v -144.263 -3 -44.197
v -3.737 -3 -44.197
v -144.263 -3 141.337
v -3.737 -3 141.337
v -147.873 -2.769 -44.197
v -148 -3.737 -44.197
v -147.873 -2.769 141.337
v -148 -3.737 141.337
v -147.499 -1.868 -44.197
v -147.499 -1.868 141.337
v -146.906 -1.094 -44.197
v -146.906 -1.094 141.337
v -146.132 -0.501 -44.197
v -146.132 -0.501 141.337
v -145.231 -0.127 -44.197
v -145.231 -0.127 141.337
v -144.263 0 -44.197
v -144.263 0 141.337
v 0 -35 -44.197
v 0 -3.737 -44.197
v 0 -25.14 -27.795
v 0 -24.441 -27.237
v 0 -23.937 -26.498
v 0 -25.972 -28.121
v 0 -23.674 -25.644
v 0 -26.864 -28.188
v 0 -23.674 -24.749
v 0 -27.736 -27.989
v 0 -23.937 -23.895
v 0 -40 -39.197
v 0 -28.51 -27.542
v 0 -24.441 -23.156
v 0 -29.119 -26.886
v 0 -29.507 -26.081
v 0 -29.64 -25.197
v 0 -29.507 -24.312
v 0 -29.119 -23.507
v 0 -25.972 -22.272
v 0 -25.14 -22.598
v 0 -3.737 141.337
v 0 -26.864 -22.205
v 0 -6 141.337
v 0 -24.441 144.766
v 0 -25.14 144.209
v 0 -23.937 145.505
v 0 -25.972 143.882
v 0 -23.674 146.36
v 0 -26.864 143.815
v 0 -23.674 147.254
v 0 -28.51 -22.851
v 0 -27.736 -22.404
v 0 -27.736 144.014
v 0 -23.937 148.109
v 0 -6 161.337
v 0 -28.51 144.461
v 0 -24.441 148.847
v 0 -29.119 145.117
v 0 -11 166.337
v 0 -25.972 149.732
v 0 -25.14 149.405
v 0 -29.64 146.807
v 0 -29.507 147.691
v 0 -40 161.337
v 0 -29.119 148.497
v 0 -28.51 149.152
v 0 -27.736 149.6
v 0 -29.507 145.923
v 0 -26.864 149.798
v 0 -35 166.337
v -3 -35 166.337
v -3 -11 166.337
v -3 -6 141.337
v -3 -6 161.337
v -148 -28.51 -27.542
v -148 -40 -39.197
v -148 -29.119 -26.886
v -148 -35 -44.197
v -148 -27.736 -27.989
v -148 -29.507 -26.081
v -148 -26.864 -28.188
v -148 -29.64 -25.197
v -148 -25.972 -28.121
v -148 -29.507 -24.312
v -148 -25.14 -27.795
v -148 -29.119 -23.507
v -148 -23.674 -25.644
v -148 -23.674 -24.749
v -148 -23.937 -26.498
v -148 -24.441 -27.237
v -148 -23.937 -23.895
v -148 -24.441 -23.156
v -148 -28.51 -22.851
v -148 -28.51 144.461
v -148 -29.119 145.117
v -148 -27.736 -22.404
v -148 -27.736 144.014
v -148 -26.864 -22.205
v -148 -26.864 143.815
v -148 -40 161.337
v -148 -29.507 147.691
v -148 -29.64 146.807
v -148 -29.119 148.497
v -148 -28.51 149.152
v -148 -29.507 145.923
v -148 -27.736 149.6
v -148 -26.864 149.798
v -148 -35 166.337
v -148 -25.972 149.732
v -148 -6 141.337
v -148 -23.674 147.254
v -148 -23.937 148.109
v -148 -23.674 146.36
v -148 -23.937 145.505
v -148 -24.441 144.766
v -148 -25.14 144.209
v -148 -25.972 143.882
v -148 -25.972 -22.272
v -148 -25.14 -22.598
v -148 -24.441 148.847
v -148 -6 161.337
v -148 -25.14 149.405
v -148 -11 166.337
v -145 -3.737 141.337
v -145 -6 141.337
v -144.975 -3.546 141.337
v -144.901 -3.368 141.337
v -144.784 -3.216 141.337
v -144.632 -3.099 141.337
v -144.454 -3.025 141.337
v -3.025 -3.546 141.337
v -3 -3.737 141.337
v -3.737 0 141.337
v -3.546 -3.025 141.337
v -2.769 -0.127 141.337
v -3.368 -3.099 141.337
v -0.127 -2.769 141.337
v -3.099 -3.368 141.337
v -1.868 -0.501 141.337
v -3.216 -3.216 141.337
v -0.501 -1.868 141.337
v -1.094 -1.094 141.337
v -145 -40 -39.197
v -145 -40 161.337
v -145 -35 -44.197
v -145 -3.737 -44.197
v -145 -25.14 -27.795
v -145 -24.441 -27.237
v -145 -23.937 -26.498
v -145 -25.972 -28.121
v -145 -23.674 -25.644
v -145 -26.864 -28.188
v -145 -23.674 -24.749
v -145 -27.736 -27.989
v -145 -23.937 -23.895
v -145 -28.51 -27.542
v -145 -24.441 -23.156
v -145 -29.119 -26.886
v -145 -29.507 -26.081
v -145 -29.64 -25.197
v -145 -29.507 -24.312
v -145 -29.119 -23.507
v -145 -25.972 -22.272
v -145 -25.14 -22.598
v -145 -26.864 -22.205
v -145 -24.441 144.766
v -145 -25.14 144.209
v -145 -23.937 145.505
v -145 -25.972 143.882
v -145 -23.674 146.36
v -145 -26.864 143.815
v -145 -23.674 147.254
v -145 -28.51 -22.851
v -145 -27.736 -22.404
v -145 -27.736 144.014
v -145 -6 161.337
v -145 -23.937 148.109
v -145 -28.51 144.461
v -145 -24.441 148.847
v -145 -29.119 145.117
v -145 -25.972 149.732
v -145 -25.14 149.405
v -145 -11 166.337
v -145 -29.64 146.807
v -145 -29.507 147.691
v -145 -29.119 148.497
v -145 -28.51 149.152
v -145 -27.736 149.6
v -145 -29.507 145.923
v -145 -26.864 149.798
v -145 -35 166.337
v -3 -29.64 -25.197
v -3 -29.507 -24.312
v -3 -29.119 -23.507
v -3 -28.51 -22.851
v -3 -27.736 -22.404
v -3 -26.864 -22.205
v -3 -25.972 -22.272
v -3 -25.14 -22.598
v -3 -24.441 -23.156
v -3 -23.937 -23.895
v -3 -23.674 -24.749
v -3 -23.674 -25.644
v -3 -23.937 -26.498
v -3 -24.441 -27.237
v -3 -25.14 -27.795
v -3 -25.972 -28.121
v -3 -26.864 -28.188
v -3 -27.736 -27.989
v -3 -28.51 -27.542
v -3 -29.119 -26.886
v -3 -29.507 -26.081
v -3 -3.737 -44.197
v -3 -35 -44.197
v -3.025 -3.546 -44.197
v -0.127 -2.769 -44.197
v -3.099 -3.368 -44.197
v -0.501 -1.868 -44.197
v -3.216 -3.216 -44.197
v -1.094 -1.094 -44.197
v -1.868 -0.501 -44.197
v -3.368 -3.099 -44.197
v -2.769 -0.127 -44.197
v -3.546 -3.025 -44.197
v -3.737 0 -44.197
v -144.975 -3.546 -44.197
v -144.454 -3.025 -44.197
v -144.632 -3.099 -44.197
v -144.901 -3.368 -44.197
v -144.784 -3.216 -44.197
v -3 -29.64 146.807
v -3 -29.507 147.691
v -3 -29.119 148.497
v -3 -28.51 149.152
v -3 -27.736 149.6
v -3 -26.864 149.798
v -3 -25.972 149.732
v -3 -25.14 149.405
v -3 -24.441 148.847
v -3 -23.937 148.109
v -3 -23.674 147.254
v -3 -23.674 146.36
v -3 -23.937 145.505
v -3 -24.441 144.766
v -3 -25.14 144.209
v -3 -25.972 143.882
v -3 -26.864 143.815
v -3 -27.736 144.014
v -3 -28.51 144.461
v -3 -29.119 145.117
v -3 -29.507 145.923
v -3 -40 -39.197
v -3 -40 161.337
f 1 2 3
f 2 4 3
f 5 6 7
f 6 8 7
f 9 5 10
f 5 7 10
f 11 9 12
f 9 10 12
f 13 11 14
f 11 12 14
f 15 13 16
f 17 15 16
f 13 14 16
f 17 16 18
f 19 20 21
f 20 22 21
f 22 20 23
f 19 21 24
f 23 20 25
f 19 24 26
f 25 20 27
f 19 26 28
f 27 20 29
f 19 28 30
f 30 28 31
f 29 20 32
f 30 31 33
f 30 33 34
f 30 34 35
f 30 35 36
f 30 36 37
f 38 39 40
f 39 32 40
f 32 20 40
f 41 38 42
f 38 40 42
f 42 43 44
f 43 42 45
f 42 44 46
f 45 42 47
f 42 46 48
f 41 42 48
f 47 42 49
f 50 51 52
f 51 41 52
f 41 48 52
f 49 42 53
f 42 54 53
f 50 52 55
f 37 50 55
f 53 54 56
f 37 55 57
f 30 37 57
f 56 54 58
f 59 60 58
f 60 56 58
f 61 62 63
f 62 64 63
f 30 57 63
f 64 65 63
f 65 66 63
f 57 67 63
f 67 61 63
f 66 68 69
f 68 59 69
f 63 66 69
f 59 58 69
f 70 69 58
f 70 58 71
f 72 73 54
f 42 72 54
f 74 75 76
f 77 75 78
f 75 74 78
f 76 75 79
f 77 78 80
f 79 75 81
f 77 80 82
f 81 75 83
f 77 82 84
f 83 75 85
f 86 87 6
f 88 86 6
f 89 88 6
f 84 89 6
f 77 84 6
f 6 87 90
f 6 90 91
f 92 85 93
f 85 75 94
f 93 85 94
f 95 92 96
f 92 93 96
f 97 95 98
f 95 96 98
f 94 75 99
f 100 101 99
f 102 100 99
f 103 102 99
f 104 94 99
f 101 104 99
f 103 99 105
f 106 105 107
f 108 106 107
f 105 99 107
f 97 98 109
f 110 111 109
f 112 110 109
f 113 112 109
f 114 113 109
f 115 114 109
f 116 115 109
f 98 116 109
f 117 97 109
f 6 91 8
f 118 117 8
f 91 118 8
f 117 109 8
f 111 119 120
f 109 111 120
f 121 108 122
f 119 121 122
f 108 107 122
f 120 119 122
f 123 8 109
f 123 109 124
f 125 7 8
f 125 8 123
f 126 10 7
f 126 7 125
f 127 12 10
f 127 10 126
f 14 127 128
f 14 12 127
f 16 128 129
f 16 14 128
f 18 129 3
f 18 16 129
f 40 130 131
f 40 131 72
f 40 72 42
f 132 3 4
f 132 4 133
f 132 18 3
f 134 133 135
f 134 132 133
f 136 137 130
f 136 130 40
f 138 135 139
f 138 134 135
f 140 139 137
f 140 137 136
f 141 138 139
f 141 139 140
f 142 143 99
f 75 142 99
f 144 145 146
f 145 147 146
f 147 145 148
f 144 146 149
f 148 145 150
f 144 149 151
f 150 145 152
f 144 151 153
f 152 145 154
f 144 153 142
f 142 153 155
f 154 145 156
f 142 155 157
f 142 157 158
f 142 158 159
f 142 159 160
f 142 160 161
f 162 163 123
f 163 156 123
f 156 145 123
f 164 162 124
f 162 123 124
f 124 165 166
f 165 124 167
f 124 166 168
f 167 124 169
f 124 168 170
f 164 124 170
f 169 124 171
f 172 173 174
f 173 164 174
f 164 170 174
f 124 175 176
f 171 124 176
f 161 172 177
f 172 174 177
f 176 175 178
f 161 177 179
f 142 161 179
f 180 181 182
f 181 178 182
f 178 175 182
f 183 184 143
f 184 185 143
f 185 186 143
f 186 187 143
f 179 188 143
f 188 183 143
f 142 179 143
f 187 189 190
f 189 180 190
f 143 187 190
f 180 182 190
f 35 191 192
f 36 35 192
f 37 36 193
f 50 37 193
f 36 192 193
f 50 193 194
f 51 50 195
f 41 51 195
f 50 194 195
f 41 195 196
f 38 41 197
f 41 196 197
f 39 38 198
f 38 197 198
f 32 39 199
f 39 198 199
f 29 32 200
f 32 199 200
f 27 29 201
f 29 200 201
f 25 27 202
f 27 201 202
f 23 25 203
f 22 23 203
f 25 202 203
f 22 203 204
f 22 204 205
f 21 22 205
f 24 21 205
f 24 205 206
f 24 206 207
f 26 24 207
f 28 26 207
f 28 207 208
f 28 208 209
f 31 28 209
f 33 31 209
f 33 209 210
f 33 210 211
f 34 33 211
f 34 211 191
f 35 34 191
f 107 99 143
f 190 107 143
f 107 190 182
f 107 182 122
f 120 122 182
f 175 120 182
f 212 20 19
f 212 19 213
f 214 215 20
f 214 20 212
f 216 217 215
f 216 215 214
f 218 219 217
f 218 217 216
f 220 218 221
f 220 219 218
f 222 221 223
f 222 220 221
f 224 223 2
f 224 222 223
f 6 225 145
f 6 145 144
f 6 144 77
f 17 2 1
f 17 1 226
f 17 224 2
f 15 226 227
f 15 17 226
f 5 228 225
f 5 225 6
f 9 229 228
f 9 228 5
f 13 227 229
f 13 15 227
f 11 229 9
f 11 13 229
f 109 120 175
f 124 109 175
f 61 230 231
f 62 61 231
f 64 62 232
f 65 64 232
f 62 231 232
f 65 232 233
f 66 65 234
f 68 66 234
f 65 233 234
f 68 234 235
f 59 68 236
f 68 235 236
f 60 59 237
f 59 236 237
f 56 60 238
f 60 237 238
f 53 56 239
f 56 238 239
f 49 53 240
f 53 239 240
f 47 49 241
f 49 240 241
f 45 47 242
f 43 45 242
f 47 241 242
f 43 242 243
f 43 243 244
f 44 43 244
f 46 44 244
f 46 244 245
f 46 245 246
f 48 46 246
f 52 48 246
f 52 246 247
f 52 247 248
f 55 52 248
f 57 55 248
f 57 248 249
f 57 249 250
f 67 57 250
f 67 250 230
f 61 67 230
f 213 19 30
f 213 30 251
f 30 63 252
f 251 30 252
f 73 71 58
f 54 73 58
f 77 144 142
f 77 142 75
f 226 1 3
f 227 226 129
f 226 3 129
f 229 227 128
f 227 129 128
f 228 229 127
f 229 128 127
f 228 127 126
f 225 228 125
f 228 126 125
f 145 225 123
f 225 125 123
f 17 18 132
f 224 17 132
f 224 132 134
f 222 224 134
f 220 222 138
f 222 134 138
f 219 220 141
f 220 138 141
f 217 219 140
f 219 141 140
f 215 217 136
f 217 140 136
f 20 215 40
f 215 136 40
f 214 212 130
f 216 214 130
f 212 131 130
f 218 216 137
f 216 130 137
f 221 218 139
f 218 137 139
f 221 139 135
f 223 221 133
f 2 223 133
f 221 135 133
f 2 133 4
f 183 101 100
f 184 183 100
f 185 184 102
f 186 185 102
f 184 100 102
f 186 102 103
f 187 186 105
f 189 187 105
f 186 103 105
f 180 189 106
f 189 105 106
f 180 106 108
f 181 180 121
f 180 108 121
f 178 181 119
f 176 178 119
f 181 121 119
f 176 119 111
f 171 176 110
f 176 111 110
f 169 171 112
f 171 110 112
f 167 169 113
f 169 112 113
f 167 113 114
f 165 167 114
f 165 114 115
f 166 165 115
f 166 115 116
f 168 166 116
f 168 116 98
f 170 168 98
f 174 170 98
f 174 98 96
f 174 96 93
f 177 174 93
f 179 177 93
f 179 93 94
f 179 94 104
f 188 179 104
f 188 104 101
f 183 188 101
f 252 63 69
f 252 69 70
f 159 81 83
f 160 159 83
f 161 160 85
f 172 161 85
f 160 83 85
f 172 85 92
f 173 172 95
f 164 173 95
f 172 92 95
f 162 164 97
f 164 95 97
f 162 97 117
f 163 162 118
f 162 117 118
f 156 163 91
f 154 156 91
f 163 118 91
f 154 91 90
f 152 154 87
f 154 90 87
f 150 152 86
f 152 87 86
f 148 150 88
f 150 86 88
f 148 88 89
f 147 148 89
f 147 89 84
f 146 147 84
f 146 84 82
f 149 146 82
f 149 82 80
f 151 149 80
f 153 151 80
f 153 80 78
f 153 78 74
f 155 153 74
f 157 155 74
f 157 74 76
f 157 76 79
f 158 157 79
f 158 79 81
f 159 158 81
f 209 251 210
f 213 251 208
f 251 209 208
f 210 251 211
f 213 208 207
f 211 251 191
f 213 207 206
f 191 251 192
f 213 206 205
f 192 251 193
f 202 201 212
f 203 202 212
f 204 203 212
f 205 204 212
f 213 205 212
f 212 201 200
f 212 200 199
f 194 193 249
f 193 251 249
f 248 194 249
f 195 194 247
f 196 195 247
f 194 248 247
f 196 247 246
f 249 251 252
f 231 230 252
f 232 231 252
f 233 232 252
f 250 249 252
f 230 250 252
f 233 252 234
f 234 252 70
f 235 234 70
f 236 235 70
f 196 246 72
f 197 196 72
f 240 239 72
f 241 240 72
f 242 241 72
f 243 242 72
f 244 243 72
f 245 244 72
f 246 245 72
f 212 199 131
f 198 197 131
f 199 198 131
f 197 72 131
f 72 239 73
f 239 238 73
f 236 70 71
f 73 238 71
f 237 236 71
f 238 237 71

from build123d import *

# Parameters (mm, degrees)
SKETCH18_W                     = 148
SKETCH18_H                     = 205.5334
BASE_FLANGE1_DEPTH             = 3
EDGE_FLANGE1_STRIP_W           = 13.4732
EDGE_FLANGE1_STRIP_H           = 3
EDGE_FLANGE1_STRIP_CUT_DEPTH   = 205.5334
EDGE_FLANGE1_STRIP_2_W         = 13.4732
EDGE_FLANGE1_STRIP_2_H         = 3
EDGE_FLANGE1_STRIP_CUT_2_DEPTH = 205.5334
EDGE_FLANGE1_DEPTH             = 205.5334
EDGE_FLANGE1_BEND_DEPTH        = 205.5334
SKETCH27_R                     = 3
CUT_EXTRUDE1_DEPTH             = 227.212201998
SKETCH28_W                     = 160
SKETCH28_H                     = 8
CUT_EXTRUDE2_DEPTH             = 25
BOSS_EXTRUDE1_DEPTH            = 5
CHAMFER2_SIZE                  = 5


# Sheet-metal steps are written as plain solids
with BuildPart() as part:
    # Sketch18 → Base-Flange1 (new body)
    with BuildSketch(Plane(origin=(0, 0, 0), x_dir=(1, 0, 0), z_dir=(0, 1, 0))):
        with Locations((-74, -63.57018807)):
            Rectangle(SKETCH18_W, SKETCH18_H)
    extrude(amount=-BASE_FLANGE1_DEPTH)

    # Edge-Flange1 strip (across the edge) → Edge-Flange1 strip cut (cut)
    with BuildSketch(Plane(origin=(0, -3, -39.19651193), x_dir=(-1, 0, 0), z_dir=(0, 0, 1))):
        with Locations((-3, -1.5)):
            Rectangle(EDGE_FLANGE1_STRIP_W, EDGE_FLANGE1_STRIP_H)
    extrude(amount=EDGE_FLANGE1_STRIP_CUT_DEPTH, mode=Mode.SUBTRACT)

    # Edge-Flange1 strip 2 (across the edge) → Edge-Flange1 strip cut 2 (cut)
    with BuildSketch(Plane(origin=(-148, -3, 166.33688807), x_dir=(1, 0, 0), z_dir=(0, 0, -1))):
        with Locations((-3, -1.5)):
            Rectangle(EDGE_FLANGE1_STRIP_2_W, EDGE_FLANGE1_STRIP_2_H)
    extrude(amount=EDGE_FLANGE1_STRIP_CUT_2_DEPTH, mode=Mode.SUBTRACT)

    # Edge-Flange1 section (across the edge) → Edge-Flange1 (add)
    with BuildSketch(Plane(origin=(0, -3, -39.19651193), x_dir=(-1, 0, 0), z_dir=(0, 0, 1))):
        with BuildLine():
            Line((0, 0.7366), (0, 37))
            Line((0, 37), (3, 37))
            Line((3, 37), (3, 0.7366))
            ThreePointArc((3, 0.7366), (3.215745145, 0.215745145), (3.7366, 0))
            Line((3.7366, 0), (3.7366, -3))
            ThreePointArc((3.7366, -3), (1.094424801, -1.905575199), (0, 0.7366))
        make_face()
    extrude(amount=EDGE_FLANGE1_DEPTH)

    # Edge-Flange1 section 2 (across the edge) → Edge-Flange1 bend (add)
    with BuildSketch(Plane(origin=(-148, -3, 166.33688807), x_dir=(1, 0, 0), z_dir=(0, 0, -1))):
        with BuildLine():
            Line((0, 0.7366), (0, 37))
            Line((0, 37), (3, 37))
            Line((3, 37), (3, 0.7366))
            ThreePointArc((3, 0.7366), (3.215745145, 0.215745145), (3.7366, 0))
            Line((3.7366, 0), (3.7366, -3))
            ThreePointArc((3.7366, -3), (1.094424801, -1.905575199), (0, 0.7366))
        make_face()
    extrude(amount=EDGE_FLANGE1_BEND_DEPTH)

    # Sketch27 → Cut-Extrude1 (cut, through all)
    with BuildSketch(Plane.ZY.offset(148)):
        with Locations(Location((-25.19651193, -26.64, 0), (0, 0, 270))):
            Circle(SKETCH27_R)
        with Locations(Location((146.80688807, -26.64, 0), (0, 0, 270))):
            Circle(SKETCH27_R)
    extrude(amount=-CUT_EXTRUDE1_DEPTH, mode=Mode.SUBTRACT)

    # Sketch28 → Cut-Extrude2 (cut)
    with BuildSketch(Plane.XY.offset(166.33688807)):
        with Locations((-79, -2)):
            Rectangle(SKETCH28_W, SKETCH28_H)
    extrude(amount=-CUT_EXTRUDE2_DEPTH, mode=Mode.SUBTRACT)

    # Sketch32 → Boss-Extrude1 (add)
    with BuildSketch(Plane(origin=(0, 0, -39.19651193), x_dir=(-1, 0, 0), z_dir=(0, 0, -1))):
        with BuildLine():
            Line((0, -3.7366), (0, -40))
            Line((0, -40), (3, -40))
            Line((3, -40), (3, -3.7366))
            ThreePointArc((3, -3.7366), (3.215745145, -3.215745145), (3.7366, -3))
            Line((3.7366, -3), (144.2634, -3))
            ThreePointArc((144.2634, -3), (144.784254855, -3.215745145), (145, -3.7366))
            Line((145, -3.7366), (145, -40))
            Line((145, -40), (148, -40))
            Line((148, -40), (148, -3.7366))
            ThreePointArc((148, -3.7366), (146.905575199, -1.094424801), (144.2634, 0))
            Line((144.2634, 0), (3.7366, 0))
            ThreePointArc((3.7366, 0), (1.094424801, -1.094424801), (0, -3.7366))
        make_face()
    extrude(amount=BOSS_EXTRUDE1_DEPTH)

    # Chamfer2
    chamfer2_edges = [part.edges().sort_by_distance(p)[0] for p in [
        (-1.5, -6, 166.33688807),
        (-146.5, -6, 166.33688807),
        (-146.5, -40, -44.19651193),
        (-1.5, -40, -44.19651193),
        (-1.5, -40, 166.33688807),
        (-146.5, -40, 166.33688807),
    ]]
    chamfer(chamfer2_edges, length=CHAMFER2_SIZE)


solid = part.part
